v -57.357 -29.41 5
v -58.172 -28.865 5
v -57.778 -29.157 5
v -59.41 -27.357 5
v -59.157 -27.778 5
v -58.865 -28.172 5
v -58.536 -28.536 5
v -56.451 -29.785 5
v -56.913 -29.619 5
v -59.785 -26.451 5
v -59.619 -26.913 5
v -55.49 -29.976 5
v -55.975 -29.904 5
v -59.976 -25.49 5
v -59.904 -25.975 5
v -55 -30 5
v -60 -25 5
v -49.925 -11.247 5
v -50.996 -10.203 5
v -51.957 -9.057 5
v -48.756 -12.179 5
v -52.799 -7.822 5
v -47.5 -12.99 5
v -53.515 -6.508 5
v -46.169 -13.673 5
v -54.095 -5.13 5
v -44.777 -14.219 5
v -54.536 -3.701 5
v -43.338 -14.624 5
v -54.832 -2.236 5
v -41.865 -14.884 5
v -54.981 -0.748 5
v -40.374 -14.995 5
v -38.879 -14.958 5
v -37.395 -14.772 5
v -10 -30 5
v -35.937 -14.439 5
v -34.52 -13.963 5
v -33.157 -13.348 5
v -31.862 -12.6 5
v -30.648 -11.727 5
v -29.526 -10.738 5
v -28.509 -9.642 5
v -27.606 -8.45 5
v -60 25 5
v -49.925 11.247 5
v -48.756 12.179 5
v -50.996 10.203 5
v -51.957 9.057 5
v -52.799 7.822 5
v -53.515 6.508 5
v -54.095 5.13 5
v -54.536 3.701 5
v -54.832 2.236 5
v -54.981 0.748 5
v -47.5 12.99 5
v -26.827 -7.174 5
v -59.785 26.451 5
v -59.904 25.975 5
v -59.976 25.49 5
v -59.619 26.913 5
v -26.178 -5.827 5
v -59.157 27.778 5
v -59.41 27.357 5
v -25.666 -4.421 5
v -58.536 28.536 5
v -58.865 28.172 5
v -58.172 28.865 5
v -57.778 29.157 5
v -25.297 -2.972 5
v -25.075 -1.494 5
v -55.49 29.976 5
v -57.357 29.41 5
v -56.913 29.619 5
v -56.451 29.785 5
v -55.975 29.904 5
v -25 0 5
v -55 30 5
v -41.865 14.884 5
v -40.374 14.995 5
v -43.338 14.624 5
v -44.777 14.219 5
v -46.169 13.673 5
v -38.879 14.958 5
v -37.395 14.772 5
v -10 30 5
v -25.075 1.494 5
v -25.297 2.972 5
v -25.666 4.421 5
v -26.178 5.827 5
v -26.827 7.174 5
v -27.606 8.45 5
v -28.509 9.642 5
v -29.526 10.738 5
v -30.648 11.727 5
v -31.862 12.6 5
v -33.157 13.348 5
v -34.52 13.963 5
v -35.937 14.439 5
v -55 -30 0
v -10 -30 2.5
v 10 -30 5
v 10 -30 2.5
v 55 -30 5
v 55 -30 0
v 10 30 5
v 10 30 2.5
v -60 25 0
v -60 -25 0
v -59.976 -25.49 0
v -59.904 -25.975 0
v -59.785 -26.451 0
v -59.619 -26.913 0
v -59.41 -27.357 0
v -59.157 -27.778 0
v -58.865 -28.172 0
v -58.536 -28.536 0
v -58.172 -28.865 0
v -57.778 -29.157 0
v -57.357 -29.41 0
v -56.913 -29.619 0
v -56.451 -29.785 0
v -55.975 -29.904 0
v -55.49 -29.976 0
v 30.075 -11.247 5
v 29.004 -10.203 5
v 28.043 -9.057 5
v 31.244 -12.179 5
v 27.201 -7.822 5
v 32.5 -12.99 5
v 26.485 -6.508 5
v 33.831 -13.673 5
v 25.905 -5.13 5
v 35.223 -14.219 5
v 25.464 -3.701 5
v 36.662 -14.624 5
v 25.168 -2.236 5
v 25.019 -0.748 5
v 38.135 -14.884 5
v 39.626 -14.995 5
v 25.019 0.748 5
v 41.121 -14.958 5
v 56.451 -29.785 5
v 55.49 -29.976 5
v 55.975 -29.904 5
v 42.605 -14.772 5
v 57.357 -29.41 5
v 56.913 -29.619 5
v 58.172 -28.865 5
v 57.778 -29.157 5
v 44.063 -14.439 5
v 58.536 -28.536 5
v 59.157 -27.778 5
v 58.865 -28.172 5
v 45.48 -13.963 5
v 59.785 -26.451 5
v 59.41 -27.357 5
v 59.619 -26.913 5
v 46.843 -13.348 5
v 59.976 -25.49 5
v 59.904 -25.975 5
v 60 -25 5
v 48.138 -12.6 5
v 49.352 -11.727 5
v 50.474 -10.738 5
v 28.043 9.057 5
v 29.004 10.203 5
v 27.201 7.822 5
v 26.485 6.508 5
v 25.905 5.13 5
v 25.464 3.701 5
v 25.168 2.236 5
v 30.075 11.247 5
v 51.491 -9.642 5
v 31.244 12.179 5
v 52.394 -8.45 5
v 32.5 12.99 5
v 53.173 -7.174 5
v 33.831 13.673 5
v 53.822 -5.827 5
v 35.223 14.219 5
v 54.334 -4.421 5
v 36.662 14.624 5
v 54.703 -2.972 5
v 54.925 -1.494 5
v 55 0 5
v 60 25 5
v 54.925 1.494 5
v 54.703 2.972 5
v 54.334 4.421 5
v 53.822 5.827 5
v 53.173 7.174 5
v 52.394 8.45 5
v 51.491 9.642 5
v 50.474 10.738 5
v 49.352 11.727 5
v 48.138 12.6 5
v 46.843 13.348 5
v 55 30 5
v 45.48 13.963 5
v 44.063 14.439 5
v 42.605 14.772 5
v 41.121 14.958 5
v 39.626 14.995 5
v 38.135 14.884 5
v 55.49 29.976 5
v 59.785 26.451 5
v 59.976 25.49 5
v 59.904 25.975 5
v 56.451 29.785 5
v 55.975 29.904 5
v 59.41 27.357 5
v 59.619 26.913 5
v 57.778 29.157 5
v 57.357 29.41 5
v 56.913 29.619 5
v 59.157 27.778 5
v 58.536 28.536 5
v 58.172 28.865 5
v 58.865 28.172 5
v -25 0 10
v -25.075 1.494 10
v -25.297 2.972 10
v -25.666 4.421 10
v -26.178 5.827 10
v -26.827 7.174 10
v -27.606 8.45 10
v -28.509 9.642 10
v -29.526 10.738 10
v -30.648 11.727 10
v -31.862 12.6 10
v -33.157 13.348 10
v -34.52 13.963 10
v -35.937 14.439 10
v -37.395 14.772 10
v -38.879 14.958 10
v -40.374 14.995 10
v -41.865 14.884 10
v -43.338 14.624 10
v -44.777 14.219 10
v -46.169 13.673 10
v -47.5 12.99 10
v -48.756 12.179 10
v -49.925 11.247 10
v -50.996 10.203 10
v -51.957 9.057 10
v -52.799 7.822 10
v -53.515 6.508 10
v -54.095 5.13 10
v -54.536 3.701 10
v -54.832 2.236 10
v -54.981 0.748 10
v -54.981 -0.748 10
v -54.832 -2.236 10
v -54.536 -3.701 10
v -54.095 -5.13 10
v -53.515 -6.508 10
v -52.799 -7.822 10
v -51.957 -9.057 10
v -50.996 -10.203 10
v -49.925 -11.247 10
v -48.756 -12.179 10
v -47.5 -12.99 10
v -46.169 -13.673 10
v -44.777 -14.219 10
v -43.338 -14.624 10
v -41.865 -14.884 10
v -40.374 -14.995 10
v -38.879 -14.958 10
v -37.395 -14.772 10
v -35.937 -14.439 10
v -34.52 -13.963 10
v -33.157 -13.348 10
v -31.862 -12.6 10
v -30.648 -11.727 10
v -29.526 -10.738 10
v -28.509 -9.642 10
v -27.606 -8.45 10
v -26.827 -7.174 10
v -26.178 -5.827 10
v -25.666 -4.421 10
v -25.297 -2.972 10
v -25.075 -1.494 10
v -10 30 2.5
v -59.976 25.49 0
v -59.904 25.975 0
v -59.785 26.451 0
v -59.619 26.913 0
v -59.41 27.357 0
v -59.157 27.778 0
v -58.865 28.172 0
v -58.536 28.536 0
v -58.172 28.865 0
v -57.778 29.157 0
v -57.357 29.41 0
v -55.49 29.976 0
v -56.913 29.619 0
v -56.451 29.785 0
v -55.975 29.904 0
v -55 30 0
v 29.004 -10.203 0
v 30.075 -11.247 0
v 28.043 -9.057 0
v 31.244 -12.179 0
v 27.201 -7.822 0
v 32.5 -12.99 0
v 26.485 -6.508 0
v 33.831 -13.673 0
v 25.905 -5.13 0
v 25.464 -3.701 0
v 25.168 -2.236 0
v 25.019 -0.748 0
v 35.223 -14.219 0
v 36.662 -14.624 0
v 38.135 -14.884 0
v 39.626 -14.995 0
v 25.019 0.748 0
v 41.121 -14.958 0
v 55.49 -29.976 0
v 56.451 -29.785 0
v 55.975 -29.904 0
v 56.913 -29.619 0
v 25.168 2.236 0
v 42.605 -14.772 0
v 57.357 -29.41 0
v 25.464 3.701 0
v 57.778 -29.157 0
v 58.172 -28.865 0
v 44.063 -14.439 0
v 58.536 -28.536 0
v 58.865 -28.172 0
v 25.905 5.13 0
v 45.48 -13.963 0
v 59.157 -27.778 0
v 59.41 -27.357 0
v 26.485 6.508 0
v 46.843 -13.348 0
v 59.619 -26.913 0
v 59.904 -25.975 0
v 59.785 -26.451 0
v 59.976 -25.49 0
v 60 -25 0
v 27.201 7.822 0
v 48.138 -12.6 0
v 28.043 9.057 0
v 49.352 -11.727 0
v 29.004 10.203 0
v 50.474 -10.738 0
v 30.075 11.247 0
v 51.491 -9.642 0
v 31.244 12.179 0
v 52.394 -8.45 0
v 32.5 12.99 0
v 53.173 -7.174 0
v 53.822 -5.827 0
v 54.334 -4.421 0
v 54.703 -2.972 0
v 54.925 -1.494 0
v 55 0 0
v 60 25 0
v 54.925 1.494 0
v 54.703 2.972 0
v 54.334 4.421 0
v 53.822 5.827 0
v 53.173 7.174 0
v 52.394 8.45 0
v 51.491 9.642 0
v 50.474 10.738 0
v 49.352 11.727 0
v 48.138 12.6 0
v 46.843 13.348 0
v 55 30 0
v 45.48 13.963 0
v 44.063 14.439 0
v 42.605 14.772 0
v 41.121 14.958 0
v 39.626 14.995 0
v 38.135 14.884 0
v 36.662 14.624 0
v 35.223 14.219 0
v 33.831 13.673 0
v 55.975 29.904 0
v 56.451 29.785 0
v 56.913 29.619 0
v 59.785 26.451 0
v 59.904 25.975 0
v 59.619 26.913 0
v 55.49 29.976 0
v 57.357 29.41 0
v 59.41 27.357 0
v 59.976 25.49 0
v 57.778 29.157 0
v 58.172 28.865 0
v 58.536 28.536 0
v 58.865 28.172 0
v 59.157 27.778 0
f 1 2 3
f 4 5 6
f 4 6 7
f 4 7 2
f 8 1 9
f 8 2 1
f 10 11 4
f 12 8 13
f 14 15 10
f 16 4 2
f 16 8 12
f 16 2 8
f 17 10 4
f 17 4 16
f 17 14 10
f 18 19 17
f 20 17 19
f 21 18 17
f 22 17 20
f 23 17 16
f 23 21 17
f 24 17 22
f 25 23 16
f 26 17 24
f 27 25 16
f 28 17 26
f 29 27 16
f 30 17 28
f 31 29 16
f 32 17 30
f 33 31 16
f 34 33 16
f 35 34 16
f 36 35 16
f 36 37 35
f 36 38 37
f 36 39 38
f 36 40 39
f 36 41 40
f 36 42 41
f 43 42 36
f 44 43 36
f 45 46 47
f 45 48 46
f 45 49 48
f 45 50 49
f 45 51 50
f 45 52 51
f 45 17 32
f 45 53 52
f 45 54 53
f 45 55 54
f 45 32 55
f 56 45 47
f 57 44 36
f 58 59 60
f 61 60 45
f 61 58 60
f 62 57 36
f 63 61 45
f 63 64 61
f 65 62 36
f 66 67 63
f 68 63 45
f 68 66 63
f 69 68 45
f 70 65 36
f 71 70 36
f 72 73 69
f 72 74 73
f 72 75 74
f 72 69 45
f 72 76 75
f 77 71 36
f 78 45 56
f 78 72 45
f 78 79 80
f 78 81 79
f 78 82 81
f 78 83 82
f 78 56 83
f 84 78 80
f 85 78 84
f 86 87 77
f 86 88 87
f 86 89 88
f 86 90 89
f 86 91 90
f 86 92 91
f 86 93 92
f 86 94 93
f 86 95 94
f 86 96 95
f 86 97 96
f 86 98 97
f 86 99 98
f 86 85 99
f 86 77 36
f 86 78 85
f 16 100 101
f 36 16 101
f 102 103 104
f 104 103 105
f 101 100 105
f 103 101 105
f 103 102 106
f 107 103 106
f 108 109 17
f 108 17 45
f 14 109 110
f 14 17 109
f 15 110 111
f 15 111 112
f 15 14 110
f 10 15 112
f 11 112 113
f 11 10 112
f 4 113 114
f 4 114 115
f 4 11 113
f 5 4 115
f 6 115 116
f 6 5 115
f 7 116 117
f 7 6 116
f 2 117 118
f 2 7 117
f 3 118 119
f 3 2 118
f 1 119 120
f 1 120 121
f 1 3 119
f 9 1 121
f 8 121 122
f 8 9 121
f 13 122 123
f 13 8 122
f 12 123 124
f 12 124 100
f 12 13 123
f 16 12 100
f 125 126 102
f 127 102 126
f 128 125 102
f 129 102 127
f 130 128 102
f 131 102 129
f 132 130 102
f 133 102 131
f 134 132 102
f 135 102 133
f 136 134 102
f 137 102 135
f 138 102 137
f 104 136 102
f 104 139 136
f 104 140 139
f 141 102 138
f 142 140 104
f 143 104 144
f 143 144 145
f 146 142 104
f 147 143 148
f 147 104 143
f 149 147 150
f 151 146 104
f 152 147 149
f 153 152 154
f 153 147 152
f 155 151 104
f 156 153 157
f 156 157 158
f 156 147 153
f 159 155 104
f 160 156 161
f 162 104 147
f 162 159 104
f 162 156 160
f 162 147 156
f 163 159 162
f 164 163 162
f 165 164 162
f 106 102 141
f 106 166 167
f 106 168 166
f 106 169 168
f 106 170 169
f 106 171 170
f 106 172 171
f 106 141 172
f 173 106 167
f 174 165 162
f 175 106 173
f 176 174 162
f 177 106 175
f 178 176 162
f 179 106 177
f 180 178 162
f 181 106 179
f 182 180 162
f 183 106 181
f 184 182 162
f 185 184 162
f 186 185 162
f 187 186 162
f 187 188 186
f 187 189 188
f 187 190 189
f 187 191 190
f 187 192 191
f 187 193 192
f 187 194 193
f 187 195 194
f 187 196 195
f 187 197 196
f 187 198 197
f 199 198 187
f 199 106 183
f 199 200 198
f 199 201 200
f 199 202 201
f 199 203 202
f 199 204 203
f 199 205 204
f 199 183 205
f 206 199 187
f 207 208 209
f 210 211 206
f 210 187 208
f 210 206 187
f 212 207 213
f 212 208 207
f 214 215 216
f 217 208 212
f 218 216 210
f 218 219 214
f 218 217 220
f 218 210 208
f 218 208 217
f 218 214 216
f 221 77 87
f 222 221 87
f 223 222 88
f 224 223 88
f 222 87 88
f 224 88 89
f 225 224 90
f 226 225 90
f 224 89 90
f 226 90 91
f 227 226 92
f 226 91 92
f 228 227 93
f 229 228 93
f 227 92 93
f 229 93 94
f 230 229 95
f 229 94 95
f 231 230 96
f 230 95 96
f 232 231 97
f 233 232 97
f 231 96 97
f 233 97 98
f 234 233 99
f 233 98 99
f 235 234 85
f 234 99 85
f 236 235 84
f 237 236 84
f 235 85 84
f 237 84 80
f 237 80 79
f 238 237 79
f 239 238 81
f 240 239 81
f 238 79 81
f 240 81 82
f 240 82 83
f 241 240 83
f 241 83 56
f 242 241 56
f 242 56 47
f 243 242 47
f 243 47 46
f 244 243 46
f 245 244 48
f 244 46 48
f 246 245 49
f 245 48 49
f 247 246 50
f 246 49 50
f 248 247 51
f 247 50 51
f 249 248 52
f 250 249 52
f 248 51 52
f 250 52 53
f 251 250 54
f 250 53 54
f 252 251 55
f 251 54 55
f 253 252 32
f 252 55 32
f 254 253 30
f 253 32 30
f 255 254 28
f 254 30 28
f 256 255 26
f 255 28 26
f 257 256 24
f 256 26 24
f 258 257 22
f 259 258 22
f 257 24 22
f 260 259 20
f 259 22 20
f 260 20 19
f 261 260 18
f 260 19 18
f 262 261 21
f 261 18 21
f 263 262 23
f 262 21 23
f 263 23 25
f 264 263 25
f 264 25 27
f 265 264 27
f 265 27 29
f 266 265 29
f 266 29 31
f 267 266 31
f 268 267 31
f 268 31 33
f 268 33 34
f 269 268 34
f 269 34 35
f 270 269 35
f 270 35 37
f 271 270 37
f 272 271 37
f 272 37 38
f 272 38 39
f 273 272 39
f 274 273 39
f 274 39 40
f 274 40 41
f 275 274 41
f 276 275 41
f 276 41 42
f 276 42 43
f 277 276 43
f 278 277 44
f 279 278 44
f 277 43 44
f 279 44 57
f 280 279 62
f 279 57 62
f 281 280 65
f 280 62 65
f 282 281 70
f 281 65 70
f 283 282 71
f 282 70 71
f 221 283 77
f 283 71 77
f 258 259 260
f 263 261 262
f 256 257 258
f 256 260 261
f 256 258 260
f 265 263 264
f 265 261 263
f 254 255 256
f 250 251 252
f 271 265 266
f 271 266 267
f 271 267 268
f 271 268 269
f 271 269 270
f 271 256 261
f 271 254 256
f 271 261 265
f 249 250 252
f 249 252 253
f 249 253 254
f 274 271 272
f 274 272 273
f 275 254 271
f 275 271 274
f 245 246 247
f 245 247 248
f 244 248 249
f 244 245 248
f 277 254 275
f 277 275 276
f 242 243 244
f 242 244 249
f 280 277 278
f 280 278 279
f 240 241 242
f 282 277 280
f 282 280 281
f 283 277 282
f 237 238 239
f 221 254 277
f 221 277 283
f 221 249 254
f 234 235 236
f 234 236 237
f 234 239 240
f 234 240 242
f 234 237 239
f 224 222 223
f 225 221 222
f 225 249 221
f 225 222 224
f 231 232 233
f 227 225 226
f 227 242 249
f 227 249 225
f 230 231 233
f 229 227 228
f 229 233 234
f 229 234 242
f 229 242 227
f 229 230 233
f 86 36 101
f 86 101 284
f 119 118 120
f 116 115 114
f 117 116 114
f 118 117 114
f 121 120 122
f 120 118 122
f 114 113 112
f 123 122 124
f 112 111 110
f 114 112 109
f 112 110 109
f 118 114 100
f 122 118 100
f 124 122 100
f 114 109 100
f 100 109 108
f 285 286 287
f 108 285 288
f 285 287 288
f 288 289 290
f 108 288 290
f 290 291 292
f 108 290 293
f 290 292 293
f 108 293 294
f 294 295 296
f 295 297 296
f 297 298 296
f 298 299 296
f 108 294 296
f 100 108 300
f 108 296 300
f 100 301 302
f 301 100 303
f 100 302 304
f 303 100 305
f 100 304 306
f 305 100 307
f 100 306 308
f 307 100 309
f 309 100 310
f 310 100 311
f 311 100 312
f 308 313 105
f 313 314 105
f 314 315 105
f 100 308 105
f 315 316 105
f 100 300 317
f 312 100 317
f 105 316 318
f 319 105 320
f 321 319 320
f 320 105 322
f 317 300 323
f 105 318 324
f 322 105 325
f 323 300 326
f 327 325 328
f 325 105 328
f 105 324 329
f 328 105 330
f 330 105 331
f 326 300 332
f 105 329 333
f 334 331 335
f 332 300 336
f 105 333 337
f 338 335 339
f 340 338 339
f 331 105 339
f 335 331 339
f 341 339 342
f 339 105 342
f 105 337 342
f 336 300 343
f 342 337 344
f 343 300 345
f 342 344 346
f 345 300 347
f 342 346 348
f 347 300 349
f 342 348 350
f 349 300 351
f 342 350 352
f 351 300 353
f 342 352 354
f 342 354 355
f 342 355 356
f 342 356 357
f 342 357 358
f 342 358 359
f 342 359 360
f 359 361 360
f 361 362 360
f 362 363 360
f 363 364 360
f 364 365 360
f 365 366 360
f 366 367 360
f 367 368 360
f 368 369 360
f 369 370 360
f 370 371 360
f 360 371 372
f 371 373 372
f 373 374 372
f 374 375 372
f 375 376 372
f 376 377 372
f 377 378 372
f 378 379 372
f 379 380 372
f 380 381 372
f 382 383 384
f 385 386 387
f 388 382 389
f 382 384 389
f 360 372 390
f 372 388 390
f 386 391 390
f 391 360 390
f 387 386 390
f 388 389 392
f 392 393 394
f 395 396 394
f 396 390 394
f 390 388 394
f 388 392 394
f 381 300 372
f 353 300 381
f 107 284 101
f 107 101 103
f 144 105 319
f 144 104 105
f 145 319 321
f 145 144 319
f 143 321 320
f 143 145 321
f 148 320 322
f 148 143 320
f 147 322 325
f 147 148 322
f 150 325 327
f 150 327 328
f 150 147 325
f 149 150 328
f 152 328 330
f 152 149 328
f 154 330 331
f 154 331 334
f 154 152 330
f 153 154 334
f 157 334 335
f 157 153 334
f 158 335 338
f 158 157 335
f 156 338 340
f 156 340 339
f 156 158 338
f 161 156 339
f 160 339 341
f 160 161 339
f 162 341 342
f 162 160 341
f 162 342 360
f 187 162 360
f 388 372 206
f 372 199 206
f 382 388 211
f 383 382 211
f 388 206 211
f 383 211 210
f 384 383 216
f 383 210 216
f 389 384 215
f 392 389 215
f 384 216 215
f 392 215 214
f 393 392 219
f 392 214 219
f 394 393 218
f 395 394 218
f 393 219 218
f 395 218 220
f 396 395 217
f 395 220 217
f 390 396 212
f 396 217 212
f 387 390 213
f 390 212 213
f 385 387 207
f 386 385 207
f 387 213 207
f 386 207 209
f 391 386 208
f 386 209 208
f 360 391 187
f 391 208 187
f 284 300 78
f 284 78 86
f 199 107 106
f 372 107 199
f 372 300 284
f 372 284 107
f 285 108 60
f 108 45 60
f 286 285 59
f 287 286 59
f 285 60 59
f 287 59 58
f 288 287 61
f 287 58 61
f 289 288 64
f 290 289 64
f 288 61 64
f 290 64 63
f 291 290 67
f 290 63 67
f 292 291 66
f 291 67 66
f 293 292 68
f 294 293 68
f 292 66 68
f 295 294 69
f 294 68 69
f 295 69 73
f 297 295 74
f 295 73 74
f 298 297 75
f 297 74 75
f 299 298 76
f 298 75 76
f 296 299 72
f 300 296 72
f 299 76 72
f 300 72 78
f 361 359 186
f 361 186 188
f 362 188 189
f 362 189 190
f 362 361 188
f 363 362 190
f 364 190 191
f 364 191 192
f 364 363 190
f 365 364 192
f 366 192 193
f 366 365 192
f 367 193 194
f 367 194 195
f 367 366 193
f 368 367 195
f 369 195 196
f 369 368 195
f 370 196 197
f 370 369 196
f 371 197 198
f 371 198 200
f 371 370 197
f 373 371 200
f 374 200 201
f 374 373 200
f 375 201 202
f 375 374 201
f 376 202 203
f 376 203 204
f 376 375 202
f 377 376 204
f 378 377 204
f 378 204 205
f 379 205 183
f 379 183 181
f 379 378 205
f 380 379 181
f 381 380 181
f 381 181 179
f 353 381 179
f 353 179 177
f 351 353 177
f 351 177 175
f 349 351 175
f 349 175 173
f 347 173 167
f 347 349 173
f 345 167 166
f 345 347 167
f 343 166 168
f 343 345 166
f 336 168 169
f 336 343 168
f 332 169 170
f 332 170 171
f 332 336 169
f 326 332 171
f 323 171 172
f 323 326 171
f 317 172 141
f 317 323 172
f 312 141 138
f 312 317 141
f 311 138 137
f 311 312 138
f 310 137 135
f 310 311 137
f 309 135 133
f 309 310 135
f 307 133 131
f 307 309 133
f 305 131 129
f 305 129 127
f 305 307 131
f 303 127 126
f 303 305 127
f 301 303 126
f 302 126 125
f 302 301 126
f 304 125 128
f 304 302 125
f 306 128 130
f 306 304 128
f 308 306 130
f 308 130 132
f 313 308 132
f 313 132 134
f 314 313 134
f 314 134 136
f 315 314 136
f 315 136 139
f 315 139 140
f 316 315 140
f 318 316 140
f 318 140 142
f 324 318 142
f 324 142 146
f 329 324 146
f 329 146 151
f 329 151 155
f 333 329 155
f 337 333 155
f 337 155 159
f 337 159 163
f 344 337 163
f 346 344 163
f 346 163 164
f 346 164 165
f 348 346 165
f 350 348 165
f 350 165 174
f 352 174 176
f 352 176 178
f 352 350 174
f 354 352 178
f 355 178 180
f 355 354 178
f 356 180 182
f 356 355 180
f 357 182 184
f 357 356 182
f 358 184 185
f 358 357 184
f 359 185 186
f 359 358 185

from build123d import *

# Parameters (mm, degrees)
F0_W     = 120
F0_H     = 60
F0_R     = 15
F1_DEPTH = 5
F2_R     = 5
F3_R     = 15
F4_DEPTH = 5
F5_W     = 20
F5_H     = 60
F6_DEPTH = 2.5


with BuildPart() as f1:
    # F0 (on Top) → F1 (new body)
    with BuildSketch(Plane.XY):
        Rectangle(F0_W, F0_H)
        with Locations((40, 0)):
            Circle(F0_R, mode=Mode.SUBTRACT)
    extrude(amount=F1_DEPTH)

    # F2
    f2_edges = [f1.edges().sort_by_distance(p)[0] for p in [
        (60, 30, 2.5),
        (60, -30, 2.5),
        (-60, 30, 2.5),
        (-60, -30, 2.5),
    ]]
    fillet(f2_edges, radius=F2_R)

    # F3 (on face) → F4 (join)
    with BuildSketch(Plane.XY.offset(5)):
        with Locations((-40, 0)):
            Circle(F3_R)
    extrude(amount=F4_DEPTH)

    # F5 (on face) → F6 (cut)
    with BuildSketch(Plane.XY.offset(5)):
        Rectangle(F5_W, F5_H)
    extrude(amount=-F6_DEPTH, mode=Mode.SUBTRACT)


solid = f1.part
